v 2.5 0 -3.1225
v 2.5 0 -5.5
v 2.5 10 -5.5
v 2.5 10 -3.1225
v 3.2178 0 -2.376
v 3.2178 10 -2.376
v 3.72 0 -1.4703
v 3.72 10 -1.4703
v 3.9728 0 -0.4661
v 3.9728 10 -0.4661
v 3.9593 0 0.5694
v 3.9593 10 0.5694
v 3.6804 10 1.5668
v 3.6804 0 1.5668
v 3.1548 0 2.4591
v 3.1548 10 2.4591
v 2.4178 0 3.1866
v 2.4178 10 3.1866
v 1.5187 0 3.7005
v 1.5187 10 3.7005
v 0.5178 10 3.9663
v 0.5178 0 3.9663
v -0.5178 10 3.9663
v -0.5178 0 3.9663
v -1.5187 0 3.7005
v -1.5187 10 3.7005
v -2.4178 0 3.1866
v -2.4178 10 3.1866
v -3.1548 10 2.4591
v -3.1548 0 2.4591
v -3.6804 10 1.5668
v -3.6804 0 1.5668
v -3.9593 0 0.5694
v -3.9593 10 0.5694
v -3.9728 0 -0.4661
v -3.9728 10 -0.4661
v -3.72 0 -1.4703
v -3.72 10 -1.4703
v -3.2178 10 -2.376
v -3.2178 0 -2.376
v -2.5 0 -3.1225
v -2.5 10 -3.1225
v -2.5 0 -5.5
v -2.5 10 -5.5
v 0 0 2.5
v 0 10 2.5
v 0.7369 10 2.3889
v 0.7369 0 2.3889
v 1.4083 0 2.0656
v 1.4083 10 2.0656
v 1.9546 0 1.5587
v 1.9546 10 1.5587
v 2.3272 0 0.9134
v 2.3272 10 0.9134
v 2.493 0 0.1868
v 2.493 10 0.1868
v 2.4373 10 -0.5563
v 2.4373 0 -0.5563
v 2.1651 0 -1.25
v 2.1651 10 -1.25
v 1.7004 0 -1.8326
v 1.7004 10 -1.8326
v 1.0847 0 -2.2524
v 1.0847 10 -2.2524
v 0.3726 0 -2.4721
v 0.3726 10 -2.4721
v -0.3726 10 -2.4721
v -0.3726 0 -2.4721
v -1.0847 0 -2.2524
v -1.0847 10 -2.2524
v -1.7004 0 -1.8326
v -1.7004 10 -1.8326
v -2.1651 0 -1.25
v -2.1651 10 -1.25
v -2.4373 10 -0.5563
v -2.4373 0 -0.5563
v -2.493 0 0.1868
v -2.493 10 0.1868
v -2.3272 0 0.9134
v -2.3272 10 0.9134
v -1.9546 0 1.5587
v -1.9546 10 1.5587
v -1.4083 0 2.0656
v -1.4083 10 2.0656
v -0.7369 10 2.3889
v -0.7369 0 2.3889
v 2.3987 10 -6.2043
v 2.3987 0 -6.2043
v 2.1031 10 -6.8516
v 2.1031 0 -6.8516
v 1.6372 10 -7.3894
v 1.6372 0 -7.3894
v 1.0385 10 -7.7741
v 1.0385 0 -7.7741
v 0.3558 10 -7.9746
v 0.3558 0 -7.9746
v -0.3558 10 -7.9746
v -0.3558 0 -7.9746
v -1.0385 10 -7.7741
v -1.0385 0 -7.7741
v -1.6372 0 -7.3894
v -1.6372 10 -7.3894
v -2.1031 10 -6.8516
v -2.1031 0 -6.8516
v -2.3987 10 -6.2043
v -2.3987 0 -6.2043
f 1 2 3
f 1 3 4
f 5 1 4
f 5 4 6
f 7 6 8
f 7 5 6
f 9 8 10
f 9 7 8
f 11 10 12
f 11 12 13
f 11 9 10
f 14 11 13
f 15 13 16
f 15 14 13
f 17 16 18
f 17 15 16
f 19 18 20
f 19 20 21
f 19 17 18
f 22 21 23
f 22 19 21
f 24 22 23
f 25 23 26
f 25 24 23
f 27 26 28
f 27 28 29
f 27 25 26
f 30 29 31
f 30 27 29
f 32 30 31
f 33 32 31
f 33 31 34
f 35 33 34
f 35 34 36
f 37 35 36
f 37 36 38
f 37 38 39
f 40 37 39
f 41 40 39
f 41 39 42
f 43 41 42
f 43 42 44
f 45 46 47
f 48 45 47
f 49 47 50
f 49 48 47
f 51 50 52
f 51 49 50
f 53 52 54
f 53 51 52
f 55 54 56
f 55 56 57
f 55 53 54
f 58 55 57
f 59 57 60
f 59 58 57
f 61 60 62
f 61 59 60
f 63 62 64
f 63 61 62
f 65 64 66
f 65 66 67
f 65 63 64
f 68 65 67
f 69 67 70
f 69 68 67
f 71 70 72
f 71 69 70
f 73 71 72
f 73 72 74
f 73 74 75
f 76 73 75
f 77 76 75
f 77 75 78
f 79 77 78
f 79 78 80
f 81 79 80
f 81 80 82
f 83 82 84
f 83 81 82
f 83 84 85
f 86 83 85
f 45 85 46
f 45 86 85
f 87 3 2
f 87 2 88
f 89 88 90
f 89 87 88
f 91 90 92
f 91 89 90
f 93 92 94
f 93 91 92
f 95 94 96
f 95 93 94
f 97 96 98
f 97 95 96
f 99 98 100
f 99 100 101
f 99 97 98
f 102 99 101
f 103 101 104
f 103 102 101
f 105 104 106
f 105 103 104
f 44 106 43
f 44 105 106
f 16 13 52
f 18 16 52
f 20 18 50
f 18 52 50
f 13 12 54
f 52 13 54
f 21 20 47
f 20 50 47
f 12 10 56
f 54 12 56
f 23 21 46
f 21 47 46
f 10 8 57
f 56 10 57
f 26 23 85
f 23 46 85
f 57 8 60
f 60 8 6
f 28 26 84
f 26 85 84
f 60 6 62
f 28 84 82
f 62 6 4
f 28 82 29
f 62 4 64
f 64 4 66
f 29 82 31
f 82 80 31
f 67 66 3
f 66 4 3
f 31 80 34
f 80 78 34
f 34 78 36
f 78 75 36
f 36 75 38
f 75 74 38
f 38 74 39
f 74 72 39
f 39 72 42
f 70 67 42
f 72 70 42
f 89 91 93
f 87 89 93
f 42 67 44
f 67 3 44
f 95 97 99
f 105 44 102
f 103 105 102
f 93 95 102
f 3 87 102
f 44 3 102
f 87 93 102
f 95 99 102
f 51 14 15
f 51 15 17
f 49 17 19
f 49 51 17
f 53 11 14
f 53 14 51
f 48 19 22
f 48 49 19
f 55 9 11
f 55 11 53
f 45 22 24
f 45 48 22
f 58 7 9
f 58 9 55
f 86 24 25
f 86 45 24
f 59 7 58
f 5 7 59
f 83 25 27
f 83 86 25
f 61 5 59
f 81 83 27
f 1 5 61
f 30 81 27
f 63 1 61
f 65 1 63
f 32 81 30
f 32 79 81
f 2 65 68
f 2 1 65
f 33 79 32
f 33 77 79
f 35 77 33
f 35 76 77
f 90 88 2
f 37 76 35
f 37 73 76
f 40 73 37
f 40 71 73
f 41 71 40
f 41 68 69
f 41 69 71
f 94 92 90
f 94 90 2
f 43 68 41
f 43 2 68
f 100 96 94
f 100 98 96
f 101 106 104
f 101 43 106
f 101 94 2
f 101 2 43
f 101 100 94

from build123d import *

# Parameters (mm, degrees)
CROQUIS1_R              = 2.5
SALIENTE_EXTRUIR1_DEPTH = 10
REDONDEO1_RADIUS        = 2.5
REDONDEO1_LENGTH        = 10


with BuildPart() as part:
    # Croquis1 → Saliente-Extruir1 (new body)
    with BuildSketch(Plane(origin=(0, 0, 0), x_dir=(1, 0, 0), z_dir=(0, 1, 0))):
        with BuildLine():
            Line((-2.5, 8), (2.5, 8))
            Line((2.5, 8), (2.5, 3.122498999))
            ThreePointArc((2.5, 3.122498999), (0, -4), (-2.5, 3.122498999))
            Line((-2.5, 3.122498999), (-2.5, 8))
        make_face()
        with Locations(Location((0, 0, 0), (0, 0, 270))):
            Circle(CROQUIS1_R, mode=Mode.SUBTRACT)
    extrude(amount=SALIENTE_EXTRUIR1_DEPTH)

    # Redondeo1: full round fillet: the end face becomes a half cylinder, R = half its width
    redondeo1_face = Plane((0, 5, -8), x_dir=(0, 1, 0), z_dir=(0, 0, -1))  # on the end face: x along it, z out of the body
    redondeo1_slab = redondeo1_face.offset(-REDONDEO1_RADIUS / 2) * Box(REDONDEO1_LENGTH, 2 * REDONDEO1_RADIUS, REDONDEO1_RADIUS, mode=Mode.PRIVATE)  # the body's end, R deep
    redondeo1_round = Plane((0, 5, -5.5), x_dir=(0, 0, -1), z_dir=(0, 1, 0)) * Cylinder(REDONDEO1_RADIUS, REDONDEO1_LENGTH, mode=Mode.PRIVATE)  # its axis R under the face
    add(redondeo1_slab - redondeo1_round, mode=Mode.SUBTRACT)


solid = part.part
